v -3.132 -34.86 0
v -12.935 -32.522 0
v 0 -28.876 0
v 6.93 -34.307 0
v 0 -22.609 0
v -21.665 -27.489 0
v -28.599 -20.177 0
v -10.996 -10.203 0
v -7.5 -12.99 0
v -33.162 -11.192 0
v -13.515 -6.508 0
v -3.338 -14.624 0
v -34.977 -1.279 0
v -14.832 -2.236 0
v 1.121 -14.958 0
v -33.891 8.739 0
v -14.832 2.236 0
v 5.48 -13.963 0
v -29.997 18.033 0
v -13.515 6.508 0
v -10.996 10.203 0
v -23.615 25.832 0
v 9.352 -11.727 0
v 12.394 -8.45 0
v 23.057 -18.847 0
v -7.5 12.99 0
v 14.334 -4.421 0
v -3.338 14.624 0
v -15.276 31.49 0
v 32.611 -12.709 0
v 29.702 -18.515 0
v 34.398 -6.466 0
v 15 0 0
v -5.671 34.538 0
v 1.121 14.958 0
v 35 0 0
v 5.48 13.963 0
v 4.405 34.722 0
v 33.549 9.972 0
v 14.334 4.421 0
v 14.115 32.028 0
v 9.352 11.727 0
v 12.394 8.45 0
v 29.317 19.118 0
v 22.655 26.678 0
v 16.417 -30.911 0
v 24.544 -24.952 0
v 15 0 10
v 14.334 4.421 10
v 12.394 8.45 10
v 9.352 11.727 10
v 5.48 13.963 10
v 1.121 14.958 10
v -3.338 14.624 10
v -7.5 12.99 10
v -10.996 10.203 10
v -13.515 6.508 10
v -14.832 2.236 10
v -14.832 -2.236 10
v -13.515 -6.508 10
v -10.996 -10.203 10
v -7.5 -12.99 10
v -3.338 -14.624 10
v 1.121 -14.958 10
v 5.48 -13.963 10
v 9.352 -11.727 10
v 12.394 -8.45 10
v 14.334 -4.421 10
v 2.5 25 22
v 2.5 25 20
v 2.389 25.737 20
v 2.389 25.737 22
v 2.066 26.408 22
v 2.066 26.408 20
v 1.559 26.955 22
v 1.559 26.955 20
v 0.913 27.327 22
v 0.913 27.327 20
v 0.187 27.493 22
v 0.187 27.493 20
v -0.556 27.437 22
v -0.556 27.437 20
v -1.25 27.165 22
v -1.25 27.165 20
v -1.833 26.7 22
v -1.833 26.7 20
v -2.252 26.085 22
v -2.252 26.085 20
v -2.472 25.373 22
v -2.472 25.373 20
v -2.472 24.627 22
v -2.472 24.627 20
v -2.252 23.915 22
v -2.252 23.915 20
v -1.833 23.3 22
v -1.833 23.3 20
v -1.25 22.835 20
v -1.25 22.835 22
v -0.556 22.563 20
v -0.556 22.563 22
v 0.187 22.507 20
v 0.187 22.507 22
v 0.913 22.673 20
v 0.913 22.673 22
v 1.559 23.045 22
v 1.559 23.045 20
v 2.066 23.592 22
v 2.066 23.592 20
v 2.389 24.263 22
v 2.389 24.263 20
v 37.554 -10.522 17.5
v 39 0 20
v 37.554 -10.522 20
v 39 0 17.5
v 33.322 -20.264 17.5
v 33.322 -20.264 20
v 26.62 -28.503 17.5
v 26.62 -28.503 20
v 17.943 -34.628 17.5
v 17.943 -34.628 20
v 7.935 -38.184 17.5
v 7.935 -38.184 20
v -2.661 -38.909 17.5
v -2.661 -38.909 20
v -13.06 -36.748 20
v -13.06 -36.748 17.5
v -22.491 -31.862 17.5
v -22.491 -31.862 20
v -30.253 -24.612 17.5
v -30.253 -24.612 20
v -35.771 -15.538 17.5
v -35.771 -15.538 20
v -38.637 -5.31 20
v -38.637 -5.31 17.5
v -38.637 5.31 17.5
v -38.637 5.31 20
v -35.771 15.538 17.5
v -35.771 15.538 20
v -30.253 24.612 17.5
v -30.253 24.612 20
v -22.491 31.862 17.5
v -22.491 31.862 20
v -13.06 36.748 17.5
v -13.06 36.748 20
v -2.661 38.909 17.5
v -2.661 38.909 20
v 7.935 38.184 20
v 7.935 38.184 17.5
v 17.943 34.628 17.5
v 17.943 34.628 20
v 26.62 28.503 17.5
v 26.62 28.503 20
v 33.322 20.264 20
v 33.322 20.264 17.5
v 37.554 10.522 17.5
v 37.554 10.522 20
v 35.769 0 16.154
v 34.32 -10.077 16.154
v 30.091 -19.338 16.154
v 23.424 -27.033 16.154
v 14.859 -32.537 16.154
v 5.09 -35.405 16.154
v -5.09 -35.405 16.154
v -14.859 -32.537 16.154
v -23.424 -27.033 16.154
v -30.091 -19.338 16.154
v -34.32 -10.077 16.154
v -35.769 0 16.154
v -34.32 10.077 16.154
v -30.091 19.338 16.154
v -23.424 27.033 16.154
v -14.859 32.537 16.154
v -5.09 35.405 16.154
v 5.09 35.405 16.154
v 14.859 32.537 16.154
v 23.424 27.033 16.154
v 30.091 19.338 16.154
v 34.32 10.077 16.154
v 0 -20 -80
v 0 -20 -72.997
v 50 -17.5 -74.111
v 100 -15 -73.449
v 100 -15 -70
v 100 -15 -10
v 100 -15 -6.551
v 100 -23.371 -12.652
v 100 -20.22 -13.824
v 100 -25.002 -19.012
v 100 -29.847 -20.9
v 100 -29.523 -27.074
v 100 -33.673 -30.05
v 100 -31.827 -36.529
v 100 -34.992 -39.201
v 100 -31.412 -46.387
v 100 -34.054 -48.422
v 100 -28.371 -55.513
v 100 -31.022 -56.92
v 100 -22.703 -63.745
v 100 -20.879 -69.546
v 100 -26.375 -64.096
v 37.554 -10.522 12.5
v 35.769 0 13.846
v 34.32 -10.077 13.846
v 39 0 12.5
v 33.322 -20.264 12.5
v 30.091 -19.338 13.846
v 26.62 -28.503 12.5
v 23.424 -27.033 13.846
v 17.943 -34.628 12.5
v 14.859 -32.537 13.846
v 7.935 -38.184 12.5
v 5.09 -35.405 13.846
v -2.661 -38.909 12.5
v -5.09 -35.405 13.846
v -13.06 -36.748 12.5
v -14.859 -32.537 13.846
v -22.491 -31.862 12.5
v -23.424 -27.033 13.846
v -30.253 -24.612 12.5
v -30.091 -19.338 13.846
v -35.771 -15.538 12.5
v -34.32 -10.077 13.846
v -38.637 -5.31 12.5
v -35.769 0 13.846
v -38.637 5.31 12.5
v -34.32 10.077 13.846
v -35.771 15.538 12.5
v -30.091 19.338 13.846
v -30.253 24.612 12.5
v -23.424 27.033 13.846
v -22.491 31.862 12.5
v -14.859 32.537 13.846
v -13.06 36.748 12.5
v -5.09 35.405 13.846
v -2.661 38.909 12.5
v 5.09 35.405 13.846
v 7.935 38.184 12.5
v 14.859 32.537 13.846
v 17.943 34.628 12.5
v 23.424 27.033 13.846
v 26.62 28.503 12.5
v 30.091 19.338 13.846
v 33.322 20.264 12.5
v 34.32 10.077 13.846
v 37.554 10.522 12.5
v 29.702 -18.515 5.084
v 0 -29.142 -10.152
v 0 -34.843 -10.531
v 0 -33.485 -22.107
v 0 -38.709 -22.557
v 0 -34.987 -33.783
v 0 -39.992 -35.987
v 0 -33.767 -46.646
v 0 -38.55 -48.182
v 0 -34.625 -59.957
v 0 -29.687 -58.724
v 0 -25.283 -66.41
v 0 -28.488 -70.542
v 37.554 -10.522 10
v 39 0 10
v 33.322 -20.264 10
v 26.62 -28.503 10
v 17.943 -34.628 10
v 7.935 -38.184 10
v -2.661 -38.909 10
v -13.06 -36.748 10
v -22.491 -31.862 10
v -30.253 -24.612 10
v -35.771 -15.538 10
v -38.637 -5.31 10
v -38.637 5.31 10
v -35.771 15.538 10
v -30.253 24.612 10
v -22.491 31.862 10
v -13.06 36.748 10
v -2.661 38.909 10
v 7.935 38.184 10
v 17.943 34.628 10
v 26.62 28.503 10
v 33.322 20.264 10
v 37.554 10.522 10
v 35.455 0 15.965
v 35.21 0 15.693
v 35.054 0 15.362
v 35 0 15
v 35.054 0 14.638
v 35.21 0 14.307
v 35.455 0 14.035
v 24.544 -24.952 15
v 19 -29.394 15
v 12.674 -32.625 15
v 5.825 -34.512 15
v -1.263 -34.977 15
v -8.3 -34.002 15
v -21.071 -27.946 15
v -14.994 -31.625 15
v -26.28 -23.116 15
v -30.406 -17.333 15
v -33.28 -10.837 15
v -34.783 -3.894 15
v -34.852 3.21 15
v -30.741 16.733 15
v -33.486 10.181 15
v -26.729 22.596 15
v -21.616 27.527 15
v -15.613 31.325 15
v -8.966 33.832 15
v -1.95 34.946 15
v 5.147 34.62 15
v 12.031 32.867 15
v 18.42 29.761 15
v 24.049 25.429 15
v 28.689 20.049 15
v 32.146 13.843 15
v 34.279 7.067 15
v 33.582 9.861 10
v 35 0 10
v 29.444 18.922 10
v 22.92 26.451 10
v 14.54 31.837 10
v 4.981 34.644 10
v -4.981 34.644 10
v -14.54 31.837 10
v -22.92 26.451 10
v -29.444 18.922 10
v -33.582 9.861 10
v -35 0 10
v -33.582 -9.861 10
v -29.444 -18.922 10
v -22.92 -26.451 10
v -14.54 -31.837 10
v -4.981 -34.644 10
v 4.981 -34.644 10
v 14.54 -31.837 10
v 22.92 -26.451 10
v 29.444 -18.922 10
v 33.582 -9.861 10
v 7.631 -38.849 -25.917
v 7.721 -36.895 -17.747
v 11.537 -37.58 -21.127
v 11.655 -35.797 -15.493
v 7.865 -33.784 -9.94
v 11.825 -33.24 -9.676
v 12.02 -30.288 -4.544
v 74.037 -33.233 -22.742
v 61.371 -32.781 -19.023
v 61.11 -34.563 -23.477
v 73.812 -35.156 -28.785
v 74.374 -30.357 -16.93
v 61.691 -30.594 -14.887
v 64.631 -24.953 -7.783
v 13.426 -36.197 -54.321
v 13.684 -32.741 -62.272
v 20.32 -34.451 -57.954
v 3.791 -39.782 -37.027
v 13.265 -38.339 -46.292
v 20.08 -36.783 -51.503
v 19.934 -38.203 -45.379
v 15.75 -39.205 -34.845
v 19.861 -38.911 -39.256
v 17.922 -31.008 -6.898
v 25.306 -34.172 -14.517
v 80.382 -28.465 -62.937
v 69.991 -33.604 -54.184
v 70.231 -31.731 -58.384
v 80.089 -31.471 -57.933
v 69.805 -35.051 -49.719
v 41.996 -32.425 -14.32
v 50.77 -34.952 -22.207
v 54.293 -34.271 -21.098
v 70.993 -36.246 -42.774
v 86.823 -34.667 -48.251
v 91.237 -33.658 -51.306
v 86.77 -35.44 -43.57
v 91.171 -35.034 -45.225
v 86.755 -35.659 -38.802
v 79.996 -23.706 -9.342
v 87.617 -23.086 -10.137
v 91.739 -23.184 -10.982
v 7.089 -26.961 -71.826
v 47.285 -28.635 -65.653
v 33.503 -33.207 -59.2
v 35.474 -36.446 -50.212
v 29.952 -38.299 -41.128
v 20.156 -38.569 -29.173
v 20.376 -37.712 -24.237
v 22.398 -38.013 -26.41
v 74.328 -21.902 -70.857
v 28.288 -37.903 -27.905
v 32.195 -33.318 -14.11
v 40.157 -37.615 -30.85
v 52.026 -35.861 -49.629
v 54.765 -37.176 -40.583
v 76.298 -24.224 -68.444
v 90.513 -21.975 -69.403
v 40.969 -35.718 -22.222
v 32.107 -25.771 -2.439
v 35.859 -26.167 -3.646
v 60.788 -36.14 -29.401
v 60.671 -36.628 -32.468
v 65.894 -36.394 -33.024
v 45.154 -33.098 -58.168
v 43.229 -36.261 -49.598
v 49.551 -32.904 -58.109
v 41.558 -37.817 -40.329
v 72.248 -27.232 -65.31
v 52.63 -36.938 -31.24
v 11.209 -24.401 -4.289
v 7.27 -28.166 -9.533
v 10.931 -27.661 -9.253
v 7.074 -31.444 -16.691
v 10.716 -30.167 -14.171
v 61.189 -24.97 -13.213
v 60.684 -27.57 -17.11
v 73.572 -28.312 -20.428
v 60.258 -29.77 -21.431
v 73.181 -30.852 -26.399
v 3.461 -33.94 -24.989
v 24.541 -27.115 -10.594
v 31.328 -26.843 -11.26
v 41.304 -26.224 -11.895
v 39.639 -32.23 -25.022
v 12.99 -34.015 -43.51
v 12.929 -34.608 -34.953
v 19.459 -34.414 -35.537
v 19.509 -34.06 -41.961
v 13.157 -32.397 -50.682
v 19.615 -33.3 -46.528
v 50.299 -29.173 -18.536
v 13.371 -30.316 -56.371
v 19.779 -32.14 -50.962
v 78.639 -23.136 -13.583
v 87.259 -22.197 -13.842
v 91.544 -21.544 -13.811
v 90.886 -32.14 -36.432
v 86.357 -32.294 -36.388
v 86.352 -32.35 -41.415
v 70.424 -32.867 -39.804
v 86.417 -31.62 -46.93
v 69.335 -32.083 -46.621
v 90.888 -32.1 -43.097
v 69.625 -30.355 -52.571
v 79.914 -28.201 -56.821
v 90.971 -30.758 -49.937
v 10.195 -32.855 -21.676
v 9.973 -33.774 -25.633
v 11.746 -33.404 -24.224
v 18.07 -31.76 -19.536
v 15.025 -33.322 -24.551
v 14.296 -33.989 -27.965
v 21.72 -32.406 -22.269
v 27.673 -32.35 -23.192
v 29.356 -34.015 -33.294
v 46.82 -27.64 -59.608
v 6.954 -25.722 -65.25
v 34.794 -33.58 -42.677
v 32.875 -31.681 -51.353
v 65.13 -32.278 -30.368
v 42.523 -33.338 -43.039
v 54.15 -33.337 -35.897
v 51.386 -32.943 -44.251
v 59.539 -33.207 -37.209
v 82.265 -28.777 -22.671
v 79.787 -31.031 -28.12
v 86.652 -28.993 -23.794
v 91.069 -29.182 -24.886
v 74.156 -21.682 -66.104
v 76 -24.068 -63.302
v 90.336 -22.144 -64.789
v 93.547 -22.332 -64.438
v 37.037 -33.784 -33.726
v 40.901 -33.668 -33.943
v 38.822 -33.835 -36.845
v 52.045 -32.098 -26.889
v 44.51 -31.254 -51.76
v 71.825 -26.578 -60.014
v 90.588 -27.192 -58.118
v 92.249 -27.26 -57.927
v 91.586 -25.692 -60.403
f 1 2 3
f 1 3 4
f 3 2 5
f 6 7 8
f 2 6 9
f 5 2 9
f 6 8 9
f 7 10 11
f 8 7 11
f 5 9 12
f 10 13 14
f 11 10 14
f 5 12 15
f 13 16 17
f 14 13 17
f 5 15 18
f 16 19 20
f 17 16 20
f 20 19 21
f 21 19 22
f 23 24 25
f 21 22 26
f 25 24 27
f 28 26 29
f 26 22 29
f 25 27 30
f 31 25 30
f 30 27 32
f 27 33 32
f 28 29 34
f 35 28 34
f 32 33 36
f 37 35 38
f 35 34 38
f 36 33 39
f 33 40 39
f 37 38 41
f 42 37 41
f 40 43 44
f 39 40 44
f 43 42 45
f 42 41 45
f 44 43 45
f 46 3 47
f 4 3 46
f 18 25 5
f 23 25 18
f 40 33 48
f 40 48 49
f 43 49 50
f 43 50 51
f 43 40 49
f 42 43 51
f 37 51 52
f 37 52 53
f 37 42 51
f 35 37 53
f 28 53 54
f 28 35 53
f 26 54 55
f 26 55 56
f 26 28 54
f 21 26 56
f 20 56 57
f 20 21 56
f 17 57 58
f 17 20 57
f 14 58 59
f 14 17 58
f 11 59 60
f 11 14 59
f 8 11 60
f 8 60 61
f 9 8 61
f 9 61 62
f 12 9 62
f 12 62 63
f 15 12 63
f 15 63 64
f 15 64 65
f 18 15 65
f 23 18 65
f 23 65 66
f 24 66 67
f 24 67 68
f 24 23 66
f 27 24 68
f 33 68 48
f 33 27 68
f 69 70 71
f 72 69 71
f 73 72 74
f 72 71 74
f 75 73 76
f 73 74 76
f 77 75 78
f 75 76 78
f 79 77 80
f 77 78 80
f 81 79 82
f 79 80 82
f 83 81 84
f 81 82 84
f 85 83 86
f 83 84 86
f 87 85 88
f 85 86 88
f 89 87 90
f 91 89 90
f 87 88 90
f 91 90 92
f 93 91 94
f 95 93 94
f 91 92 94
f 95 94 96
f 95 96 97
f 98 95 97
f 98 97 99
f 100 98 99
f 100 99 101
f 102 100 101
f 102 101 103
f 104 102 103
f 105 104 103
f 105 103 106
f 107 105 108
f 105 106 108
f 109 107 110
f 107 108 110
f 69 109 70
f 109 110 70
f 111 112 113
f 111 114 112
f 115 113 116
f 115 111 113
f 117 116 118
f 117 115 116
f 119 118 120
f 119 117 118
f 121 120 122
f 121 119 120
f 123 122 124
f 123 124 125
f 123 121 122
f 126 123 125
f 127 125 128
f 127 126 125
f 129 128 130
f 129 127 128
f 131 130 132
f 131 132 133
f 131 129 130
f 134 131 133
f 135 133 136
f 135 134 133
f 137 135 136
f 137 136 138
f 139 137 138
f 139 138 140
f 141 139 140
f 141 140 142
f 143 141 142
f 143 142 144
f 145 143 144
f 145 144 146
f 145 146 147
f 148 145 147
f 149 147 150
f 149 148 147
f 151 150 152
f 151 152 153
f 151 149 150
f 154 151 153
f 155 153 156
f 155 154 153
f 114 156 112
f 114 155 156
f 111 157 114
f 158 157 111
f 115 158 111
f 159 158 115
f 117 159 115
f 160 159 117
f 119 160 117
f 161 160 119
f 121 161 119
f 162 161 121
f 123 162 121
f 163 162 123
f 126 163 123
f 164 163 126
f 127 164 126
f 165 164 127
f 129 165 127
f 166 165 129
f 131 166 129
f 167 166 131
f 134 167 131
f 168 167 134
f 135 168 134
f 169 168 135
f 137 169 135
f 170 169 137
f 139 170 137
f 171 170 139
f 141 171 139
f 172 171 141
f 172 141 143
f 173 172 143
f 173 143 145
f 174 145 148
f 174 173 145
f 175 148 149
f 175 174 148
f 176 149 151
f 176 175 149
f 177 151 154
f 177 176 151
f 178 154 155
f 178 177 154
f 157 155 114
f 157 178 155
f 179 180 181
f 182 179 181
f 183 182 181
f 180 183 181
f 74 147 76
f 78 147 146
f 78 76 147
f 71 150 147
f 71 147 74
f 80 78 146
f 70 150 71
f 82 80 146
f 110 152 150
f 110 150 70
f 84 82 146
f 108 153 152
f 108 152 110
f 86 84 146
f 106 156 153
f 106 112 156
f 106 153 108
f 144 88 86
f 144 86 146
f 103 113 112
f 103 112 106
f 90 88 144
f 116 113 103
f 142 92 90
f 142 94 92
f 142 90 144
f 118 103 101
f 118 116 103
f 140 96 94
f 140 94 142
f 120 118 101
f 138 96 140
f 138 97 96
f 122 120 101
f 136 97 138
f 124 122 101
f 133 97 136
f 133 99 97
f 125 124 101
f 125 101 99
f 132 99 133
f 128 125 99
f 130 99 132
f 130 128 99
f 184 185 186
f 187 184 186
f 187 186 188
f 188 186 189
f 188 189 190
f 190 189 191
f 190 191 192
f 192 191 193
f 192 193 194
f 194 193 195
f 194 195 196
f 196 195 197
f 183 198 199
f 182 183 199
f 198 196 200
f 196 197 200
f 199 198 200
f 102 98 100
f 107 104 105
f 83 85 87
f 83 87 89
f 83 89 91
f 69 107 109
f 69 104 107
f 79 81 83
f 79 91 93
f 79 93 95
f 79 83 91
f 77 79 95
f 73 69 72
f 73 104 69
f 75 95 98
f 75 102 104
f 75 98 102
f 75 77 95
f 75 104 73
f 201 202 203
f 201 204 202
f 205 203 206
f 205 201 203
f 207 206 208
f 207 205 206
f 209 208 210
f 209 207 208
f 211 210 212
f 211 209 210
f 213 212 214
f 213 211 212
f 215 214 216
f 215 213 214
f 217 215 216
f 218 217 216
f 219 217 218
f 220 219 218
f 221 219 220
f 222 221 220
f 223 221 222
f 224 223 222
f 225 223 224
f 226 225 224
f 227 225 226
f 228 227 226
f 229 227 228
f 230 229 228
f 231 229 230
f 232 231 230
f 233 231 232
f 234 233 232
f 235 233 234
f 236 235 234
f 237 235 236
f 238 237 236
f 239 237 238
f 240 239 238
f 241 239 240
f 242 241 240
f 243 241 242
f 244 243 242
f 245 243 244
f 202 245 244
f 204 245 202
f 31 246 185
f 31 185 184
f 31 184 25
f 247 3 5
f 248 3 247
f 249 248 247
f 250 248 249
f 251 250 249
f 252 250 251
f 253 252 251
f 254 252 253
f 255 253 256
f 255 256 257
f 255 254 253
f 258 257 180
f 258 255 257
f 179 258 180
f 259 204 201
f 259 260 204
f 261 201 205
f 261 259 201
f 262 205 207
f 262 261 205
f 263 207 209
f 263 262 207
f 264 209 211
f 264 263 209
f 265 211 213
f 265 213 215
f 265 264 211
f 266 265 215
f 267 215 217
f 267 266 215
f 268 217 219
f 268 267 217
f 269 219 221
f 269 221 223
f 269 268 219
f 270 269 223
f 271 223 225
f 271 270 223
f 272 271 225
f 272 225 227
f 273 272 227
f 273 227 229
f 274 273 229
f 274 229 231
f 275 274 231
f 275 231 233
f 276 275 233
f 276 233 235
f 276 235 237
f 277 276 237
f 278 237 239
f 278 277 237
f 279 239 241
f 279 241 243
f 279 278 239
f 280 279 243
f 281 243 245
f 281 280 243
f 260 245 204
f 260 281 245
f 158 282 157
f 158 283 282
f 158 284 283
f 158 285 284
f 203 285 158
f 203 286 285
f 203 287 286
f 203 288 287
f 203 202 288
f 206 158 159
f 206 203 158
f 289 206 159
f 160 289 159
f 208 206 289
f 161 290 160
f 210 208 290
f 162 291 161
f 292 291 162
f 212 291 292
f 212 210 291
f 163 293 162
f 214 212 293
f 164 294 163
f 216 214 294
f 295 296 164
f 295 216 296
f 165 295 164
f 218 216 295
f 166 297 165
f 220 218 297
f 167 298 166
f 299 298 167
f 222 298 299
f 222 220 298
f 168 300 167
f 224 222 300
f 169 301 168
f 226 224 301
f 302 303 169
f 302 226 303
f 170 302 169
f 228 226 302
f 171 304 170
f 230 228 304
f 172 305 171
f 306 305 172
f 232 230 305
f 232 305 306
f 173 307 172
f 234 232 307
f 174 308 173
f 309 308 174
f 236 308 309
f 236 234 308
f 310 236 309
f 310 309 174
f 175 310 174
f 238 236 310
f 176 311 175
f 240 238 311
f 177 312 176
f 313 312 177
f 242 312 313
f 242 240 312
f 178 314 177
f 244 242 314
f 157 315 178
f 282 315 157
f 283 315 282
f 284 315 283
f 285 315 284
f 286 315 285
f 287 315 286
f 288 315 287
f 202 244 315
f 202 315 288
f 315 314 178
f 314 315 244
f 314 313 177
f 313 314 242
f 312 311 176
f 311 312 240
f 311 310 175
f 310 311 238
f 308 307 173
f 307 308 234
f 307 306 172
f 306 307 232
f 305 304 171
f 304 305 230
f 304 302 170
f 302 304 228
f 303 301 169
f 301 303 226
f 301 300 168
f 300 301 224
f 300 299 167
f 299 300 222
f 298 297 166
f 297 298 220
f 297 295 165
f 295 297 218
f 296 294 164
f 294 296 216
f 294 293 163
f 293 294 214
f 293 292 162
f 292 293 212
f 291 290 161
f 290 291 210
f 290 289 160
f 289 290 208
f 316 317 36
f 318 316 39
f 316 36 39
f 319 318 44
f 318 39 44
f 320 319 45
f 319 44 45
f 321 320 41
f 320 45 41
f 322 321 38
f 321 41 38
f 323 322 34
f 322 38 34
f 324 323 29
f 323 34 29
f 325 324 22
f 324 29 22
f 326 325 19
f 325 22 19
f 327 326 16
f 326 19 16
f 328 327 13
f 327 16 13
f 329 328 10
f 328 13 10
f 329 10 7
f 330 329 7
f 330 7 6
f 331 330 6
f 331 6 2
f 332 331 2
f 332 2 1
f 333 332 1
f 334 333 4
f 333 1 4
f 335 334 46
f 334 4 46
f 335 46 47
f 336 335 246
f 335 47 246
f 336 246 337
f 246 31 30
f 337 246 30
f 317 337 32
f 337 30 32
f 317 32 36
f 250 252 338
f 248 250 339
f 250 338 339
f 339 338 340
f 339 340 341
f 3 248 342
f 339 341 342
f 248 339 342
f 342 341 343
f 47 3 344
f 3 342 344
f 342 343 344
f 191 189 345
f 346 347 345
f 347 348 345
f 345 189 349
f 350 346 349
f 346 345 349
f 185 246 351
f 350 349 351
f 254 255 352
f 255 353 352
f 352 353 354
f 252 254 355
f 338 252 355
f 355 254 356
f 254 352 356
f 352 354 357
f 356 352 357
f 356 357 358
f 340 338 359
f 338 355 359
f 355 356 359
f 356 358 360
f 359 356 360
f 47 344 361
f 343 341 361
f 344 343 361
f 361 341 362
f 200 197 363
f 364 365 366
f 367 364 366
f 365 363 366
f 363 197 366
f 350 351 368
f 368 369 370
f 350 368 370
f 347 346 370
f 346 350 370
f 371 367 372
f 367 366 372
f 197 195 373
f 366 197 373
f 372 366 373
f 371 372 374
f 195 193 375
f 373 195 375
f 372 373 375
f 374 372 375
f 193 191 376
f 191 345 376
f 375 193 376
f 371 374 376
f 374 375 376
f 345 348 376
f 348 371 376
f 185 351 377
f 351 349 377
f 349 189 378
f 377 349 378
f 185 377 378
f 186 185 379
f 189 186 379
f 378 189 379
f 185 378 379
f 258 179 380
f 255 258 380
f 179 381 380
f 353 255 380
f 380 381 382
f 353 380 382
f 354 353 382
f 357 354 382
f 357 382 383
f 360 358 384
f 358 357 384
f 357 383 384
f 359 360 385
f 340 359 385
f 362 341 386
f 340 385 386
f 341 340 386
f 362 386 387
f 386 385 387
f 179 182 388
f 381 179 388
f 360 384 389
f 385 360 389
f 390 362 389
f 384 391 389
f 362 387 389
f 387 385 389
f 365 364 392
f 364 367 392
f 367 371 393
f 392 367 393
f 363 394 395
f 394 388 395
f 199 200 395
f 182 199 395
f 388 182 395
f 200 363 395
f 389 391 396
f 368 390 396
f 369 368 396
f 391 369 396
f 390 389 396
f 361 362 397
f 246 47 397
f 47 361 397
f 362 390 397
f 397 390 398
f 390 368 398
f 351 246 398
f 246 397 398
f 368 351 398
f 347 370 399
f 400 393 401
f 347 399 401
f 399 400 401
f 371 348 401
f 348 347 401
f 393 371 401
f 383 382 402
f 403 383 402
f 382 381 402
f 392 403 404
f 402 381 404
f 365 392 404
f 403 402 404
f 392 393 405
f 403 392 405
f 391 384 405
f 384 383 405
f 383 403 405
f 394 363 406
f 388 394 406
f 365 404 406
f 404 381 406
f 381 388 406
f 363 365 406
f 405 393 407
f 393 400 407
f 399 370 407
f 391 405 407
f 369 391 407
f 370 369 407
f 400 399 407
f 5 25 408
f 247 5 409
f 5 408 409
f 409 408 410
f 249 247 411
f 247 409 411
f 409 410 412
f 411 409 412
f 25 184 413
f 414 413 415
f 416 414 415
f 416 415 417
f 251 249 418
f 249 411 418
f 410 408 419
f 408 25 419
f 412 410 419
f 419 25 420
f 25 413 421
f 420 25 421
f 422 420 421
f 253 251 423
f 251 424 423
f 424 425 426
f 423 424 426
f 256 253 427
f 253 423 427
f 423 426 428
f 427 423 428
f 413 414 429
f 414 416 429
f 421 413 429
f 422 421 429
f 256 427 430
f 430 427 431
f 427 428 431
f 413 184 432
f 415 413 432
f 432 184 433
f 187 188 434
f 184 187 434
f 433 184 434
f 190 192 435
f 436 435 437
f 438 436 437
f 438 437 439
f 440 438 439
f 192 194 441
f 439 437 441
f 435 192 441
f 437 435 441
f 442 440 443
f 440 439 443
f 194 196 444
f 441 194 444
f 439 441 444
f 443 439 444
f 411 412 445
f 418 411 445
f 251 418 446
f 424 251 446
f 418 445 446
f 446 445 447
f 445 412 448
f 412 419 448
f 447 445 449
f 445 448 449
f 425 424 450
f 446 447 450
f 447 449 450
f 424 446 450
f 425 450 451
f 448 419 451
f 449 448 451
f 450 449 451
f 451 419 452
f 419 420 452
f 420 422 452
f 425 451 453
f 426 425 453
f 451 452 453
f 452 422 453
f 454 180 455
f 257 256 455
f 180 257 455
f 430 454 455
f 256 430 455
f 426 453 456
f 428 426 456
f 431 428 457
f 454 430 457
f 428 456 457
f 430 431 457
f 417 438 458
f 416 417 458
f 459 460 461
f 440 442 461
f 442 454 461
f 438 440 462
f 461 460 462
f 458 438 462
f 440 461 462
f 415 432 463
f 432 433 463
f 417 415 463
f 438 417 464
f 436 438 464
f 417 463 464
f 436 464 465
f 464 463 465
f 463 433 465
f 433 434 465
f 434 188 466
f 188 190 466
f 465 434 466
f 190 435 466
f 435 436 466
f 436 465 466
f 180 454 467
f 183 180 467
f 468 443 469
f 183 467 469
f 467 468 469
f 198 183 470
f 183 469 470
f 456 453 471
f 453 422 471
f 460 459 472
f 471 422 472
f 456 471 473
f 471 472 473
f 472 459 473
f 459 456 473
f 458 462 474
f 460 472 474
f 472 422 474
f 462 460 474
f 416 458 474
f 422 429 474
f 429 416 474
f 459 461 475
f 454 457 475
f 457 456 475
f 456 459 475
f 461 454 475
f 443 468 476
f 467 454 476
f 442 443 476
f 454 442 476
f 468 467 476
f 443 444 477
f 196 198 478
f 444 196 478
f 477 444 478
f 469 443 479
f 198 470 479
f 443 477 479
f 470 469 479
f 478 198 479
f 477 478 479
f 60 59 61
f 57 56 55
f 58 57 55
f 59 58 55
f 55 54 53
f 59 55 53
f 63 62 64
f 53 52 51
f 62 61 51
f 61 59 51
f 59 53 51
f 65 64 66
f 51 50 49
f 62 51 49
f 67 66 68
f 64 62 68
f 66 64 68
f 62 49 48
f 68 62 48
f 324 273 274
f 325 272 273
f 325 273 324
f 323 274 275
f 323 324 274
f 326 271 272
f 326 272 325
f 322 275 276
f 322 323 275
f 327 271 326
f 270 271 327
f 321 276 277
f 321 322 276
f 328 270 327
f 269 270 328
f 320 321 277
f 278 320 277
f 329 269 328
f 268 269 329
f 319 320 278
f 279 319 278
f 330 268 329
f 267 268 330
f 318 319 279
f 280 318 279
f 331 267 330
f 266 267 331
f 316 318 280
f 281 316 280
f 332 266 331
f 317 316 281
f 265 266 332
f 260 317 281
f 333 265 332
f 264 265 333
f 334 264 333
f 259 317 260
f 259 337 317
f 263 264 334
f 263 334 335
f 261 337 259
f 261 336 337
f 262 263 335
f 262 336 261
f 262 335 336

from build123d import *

# Parameters (mm, degrees)
SKETCH1_R           = 35
SKETCH1_R_2         = 15
BOSS_EXTRUDE1_DEPTH = 10
SKETCH5_R           = 35
BOSS_EXTRUDE3_DEPTH = 10
SKETCH4_R           = 2.5
BOSS_EXTRUDE2_DEPTH = 2


with BuildPart() as part:
    # Sketch1 → Boss-Extrude1 (new body)
    with BuildSketch(Plane.XY):
        Circle(SKETCH1_R)
        Circle(SKETCH1_R_2, mode=Mode.SUBTRACT)
    extrude(amount=BOSS_EXTRUDE1_DEPTH)

    # Sketch2 for Loft1 → Loft1 section 0
    with BuildSketch(Plane(origin=(0, 0, 0), x_dir=(0, 0, -1), z_dir=(1, 0, 0))):
        with BuildLine():
            Line((-10, -20), (-2.996710384, -20))
            # circular arc as an exact rational Bezier (weights 1, cos(half-angle), 1)
            Bezier((-2.996710384, -20), (35, -55.538461538), (72.996710384, -20), weights=[1, 0.730337079, 1])
            Line((72.996710384, -20), (80, -20))
            Bezier((80, -20), (35, -69.846153846), (-10, -20), weights=[1, 0.670103093, 1])
        make_face()
    # Sketch3 for Loft1 → Loft1 section 1
    with BuildSketch(Plane(origin=(100, 0, 0), x_dir=(0, 0, -1), z_dir=(1, 0, 0))):
        with BuildLine():
            Line((10, -15), (6.551180448, -15))
            Bezier((6.551180448, -15), (40, -77.258592471), (73.448819552, -15), weights=[1, 0.47327653, 1])
            Line((73.448819552, -15), (70, -15))
            Bezier((70, -15), (40, -65.081833061), (10, -15), weights=[1, 0.513877208, 1])
        make_face()
    loft()

    # Sketch5 → Boss-Extrude3 (add)
    with BuildSketch(Plane.XY.offset(10)):
        with Locations(Location((0, 0, 0), (0, 0, 314.528269686))):
            Circle(SKETCH5_R)
    extrude(amount=BOSS_EXTRUDE3_DEPTH)

    # Sketch7 → Revolve1 (revolve)
    with BuildSketch(Plane.ZY, mode=Mode.PRIVATE) as revolve1_sk:
        with BuildLine():
            Line((20, 34), (20, 39))
            Line((20, 39), (17.5, 39))
            Line((17.5, 39), (16.153846154, 35.769230769))
            ThreePointArc((16.153846154, 35.769230769), (15, 35), (13.846153846, 35.769230769))
            Line((13.846153846, 35.769230769), (12.5, 39))
            Line((12.5, 39), (10, 39))
            Line((10, 39), (10, 34))
            Line((10, 34), (20, 34))
        make_face()
    revolve(revolve1_sk.sketch.rotate(Axis((0, 0, 20), (0, 0, -1)), 90), axis=Axis((0, 0, 20), (0, 0, -1)))

    # Sketch4 → Boss-Extrude2 (add)
    with BuildSketch(Plane.XY.offset(20)):
        with Locations((0, 25)):
            Circle(SKETCH4_R)
    extrude(amount=BOSS_EXTRUDE2_DEPTH)


solid = part.part
